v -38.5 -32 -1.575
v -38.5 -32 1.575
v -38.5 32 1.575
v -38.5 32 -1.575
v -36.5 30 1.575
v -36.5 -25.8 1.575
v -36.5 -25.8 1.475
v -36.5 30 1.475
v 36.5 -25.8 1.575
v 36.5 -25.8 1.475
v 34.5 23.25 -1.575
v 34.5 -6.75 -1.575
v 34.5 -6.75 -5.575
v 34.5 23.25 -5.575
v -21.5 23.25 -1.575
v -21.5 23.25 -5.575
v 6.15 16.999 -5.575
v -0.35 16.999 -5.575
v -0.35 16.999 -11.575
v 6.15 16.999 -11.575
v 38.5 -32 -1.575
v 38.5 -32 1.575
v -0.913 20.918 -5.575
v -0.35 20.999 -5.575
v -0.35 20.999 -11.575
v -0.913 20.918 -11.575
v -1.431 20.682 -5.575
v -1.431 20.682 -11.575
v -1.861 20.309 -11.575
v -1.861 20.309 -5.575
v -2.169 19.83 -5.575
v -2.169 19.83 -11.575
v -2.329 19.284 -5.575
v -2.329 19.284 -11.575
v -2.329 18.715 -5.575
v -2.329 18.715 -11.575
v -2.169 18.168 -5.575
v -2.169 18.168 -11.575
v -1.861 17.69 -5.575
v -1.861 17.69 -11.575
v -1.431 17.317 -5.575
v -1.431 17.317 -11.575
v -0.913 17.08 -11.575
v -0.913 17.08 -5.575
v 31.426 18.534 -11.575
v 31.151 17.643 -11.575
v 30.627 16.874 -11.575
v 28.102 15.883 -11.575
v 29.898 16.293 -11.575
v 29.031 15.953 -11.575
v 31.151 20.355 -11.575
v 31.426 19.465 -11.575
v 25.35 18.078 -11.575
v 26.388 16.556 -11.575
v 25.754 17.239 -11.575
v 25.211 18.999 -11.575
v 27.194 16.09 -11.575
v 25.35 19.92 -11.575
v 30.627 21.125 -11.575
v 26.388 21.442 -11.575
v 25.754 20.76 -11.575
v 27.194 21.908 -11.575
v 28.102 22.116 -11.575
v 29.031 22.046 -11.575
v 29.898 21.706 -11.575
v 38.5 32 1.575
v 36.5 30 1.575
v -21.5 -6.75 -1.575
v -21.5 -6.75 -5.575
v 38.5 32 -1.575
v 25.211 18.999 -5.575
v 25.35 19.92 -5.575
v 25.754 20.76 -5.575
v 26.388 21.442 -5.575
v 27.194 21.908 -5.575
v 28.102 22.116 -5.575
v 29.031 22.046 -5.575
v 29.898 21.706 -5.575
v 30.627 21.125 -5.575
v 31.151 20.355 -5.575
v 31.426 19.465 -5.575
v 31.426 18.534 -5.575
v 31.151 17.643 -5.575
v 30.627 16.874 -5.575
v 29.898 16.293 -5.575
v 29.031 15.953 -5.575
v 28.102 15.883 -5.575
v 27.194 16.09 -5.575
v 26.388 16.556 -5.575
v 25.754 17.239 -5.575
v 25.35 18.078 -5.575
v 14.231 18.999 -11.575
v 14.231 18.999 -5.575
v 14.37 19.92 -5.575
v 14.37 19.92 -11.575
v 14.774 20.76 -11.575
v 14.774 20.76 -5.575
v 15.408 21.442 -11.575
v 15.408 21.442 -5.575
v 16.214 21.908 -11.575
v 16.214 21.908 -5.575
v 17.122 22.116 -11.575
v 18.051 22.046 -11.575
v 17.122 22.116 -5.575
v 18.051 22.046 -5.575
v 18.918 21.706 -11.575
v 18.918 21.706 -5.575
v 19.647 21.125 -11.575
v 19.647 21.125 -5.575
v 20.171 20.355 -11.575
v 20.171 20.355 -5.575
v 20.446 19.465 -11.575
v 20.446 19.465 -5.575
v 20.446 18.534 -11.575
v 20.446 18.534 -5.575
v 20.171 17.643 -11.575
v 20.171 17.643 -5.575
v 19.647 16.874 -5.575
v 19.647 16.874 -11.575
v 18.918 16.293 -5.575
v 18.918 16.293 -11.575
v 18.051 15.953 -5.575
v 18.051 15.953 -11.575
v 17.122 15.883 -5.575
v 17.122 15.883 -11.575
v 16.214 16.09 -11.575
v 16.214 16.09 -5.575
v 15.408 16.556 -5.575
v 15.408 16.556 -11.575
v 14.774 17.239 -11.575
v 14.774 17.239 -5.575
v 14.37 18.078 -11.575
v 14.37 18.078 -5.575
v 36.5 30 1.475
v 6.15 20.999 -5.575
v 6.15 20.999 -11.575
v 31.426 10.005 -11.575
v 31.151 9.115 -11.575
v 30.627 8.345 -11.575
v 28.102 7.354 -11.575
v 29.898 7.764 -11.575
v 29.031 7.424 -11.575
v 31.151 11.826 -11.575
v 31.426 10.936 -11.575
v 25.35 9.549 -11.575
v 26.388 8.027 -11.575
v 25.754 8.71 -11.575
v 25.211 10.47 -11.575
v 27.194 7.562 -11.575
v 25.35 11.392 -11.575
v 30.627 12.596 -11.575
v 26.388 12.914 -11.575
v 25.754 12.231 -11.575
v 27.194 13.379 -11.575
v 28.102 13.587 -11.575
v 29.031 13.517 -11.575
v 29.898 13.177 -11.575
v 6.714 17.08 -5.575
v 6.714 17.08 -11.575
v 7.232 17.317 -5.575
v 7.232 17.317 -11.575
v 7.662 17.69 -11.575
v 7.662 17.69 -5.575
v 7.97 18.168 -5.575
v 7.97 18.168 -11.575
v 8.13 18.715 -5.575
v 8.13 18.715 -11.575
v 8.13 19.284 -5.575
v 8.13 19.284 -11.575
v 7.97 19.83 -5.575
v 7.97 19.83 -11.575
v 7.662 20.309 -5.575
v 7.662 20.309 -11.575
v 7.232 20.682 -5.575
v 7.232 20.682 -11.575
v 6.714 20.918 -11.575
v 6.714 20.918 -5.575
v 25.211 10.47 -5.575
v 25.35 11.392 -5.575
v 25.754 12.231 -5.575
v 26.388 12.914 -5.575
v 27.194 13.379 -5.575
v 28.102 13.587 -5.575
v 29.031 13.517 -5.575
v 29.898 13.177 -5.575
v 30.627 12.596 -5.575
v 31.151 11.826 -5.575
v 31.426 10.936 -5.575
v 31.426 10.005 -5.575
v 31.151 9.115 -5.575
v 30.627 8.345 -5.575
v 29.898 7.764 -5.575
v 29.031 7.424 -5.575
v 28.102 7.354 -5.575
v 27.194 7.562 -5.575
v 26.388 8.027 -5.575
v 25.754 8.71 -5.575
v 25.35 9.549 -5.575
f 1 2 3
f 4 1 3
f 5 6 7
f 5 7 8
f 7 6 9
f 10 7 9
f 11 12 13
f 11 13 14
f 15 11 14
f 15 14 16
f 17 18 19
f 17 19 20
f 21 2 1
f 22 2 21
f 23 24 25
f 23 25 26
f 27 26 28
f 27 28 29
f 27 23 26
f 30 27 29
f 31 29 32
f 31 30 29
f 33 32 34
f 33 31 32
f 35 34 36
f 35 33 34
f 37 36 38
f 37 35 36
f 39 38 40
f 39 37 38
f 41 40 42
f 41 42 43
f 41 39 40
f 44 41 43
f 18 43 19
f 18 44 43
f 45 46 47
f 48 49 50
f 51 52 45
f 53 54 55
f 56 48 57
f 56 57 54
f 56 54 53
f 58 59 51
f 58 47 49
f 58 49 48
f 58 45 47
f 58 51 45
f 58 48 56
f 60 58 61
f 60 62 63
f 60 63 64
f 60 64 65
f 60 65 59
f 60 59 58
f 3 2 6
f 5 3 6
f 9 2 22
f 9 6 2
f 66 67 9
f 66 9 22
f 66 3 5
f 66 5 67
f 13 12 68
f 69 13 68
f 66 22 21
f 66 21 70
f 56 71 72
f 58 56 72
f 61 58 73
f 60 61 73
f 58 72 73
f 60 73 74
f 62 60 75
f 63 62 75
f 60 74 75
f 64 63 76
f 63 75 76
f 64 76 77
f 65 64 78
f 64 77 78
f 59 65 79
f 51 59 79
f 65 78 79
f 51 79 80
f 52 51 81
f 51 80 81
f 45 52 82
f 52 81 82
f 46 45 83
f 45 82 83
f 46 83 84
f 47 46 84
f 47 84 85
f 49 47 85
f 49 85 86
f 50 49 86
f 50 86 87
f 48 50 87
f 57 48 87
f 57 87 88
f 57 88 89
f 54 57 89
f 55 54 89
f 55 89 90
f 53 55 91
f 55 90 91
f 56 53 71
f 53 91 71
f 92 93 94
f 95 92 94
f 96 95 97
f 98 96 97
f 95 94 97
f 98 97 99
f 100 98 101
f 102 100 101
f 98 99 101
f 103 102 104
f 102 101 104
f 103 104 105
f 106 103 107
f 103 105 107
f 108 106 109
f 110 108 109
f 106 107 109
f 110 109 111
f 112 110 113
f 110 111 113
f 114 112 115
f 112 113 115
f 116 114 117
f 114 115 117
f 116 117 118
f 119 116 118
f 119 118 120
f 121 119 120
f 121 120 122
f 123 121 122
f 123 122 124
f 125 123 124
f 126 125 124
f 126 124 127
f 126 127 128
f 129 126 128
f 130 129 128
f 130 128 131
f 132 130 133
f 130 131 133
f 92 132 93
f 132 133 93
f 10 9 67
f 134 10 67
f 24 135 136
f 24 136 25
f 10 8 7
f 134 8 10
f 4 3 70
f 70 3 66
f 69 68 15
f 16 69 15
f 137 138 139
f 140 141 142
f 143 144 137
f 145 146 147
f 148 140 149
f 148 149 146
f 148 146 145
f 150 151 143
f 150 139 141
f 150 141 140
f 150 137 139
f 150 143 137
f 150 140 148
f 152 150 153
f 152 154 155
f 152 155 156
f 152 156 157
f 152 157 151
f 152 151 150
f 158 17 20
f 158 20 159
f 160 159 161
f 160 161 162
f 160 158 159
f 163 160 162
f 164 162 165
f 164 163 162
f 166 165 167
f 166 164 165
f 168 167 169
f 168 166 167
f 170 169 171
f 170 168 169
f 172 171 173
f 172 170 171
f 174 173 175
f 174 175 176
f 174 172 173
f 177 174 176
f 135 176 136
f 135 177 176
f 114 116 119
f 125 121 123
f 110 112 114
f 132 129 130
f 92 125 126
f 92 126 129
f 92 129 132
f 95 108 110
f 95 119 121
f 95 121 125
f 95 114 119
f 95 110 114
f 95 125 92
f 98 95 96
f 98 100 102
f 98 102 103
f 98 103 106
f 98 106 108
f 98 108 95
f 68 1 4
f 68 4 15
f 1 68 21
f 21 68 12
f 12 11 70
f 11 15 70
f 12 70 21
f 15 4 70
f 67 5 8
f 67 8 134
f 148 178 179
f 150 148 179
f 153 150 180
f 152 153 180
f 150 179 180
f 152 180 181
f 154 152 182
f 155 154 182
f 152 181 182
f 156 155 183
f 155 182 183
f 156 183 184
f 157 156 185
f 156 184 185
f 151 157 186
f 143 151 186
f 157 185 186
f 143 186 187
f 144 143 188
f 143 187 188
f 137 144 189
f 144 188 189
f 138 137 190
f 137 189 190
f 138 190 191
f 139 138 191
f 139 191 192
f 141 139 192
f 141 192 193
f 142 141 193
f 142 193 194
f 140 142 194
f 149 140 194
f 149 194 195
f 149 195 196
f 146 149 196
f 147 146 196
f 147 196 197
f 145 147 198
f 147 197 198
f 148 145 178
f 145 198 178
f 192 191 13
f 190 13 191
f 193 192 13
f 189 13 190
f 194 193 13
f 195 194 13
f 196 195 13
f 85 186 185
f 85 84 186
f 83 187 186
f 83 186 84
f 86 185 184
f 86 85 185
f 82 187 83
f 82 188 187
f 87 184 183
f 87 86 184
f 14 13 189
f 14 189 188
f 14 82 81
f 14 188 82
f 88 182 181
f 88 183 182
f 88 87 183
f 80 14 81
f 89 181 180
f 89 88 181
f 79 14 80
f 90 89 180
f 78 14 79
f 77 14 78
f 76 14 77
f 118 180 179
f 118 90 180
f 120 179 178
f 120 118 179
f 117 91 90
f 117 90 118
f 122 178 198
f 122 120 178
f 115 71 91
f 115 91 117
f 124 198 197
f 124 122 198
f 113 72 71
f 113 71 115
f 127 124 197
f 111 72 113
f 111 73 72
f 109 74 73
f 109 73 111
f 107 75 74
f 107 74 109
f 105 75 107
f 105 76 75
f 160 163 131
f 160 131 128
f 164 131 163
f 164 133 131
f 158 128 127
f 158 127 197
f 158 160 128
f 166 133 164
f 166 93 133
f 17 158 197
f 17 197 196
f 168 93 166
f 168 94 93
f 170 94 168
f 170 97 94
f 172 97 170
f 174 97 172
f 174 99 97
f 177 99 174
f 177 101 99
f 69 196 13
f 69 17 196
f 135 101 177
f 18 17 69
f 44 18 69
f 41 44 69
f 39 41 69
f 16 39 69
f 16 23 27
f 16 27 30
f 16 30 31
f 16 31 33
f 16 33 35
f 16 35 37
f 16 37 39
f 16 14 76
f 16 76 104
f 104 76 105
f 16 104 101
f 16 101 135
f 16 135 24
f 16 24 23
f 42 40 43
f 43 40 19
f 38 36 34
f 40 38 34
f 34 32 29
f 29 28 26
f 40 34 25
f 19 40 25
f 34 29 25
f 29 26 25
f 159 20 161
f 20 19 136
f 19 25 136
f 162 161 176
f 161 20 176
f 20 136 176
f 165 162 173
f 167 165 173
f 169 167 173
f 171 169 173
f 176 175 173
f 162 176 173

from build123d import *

# Parameters (mm, degrees)
SKETCH1_W           = 77
SKETCH1_H           = 64
BOSS_EXTRUDE1_DEPTH = 1.575
SKETCH2_W           = 56
SKETCH2_H           = 30
BOSS_EXTRUDE2_DEPTH = 4
SKETCH3_R           = 3.125
BOSS_EXTRUDE3_DEPTH = 6
SKETCH4_W           = 73
SKETCH4_H           = 55.8
CUT_EXTRUDE1_DEPTH  = 0.1


with BuildPart() as part:
    # Sketch1 → Boss-Extrude1 (new, symmetric)
    with BuildSketch(Plane.XY):
        Rectangle(SKETCH1_W, SKETCH1_H)
    extrude(amount=BOSS_EXTRUDE1_DEPTH, both=True)

    # Sketch2 → Boss-Extrude2 (add)
    with BuildSketch(Plane(origin=(0, 0, -1.575), x_dir=(-1, 0, 0), z_dir=(0, 0, -1))):
        with Locations((-6.5, 8.25)):
            Rectangle(SKETCH2_W, SKETCH2_H)
    extrude(amount=BOSS_EXTRUDE2_DEPTH)

    # Sketch3 → Boss-Extrude3 (add)
    with BuildSketch(Plane(origin=(0, 0, -5.575), x_dir=(-1, 0, 0), z_dir=(0, 0, -1))):
        with Locations((-28.335952563, 18.999270837)):
            Circle(SKETCH3_R)
        with Locations((-17.355937958, 18.999270837)):
            Circle(SKETCH3_R)
        with Locations((-28.335952563, 10.470489708)):
            Circle(SKETCH3_R)
        with BuildLine():
            Line((-6.150306614, 20.999270837), (0.349693386, 20.999270837))
            ThreePointArc((0.349693386, 20.999270837), (2.349693386, 18.999270837), (0.349693386, 16.999270837))
            Line((0.349693386, 16.999270837), (-6.150306614, 16.999270837))
            ThreePointArc((-6.150306614, 16.999270837), (-8.150306614, 18.999270837), (-6.150306614, 20.999270837))
        make_face()
    extrude(amount=BOSS_EXTRUDE3_DEPTH)

    # Sketch4 → Cut-Extrude1 (cut)
    with BuildSketch(Plane.XY.offset(1.575)):
        with Locations((0, 2.1)):
            Rectangle(SKETCH4_W, SKETCH4_H)
    extrude(amount=-CUT_EXTRUDE1_DEPTH, mode=Mode.SUBTRACT)


solid = part.part
